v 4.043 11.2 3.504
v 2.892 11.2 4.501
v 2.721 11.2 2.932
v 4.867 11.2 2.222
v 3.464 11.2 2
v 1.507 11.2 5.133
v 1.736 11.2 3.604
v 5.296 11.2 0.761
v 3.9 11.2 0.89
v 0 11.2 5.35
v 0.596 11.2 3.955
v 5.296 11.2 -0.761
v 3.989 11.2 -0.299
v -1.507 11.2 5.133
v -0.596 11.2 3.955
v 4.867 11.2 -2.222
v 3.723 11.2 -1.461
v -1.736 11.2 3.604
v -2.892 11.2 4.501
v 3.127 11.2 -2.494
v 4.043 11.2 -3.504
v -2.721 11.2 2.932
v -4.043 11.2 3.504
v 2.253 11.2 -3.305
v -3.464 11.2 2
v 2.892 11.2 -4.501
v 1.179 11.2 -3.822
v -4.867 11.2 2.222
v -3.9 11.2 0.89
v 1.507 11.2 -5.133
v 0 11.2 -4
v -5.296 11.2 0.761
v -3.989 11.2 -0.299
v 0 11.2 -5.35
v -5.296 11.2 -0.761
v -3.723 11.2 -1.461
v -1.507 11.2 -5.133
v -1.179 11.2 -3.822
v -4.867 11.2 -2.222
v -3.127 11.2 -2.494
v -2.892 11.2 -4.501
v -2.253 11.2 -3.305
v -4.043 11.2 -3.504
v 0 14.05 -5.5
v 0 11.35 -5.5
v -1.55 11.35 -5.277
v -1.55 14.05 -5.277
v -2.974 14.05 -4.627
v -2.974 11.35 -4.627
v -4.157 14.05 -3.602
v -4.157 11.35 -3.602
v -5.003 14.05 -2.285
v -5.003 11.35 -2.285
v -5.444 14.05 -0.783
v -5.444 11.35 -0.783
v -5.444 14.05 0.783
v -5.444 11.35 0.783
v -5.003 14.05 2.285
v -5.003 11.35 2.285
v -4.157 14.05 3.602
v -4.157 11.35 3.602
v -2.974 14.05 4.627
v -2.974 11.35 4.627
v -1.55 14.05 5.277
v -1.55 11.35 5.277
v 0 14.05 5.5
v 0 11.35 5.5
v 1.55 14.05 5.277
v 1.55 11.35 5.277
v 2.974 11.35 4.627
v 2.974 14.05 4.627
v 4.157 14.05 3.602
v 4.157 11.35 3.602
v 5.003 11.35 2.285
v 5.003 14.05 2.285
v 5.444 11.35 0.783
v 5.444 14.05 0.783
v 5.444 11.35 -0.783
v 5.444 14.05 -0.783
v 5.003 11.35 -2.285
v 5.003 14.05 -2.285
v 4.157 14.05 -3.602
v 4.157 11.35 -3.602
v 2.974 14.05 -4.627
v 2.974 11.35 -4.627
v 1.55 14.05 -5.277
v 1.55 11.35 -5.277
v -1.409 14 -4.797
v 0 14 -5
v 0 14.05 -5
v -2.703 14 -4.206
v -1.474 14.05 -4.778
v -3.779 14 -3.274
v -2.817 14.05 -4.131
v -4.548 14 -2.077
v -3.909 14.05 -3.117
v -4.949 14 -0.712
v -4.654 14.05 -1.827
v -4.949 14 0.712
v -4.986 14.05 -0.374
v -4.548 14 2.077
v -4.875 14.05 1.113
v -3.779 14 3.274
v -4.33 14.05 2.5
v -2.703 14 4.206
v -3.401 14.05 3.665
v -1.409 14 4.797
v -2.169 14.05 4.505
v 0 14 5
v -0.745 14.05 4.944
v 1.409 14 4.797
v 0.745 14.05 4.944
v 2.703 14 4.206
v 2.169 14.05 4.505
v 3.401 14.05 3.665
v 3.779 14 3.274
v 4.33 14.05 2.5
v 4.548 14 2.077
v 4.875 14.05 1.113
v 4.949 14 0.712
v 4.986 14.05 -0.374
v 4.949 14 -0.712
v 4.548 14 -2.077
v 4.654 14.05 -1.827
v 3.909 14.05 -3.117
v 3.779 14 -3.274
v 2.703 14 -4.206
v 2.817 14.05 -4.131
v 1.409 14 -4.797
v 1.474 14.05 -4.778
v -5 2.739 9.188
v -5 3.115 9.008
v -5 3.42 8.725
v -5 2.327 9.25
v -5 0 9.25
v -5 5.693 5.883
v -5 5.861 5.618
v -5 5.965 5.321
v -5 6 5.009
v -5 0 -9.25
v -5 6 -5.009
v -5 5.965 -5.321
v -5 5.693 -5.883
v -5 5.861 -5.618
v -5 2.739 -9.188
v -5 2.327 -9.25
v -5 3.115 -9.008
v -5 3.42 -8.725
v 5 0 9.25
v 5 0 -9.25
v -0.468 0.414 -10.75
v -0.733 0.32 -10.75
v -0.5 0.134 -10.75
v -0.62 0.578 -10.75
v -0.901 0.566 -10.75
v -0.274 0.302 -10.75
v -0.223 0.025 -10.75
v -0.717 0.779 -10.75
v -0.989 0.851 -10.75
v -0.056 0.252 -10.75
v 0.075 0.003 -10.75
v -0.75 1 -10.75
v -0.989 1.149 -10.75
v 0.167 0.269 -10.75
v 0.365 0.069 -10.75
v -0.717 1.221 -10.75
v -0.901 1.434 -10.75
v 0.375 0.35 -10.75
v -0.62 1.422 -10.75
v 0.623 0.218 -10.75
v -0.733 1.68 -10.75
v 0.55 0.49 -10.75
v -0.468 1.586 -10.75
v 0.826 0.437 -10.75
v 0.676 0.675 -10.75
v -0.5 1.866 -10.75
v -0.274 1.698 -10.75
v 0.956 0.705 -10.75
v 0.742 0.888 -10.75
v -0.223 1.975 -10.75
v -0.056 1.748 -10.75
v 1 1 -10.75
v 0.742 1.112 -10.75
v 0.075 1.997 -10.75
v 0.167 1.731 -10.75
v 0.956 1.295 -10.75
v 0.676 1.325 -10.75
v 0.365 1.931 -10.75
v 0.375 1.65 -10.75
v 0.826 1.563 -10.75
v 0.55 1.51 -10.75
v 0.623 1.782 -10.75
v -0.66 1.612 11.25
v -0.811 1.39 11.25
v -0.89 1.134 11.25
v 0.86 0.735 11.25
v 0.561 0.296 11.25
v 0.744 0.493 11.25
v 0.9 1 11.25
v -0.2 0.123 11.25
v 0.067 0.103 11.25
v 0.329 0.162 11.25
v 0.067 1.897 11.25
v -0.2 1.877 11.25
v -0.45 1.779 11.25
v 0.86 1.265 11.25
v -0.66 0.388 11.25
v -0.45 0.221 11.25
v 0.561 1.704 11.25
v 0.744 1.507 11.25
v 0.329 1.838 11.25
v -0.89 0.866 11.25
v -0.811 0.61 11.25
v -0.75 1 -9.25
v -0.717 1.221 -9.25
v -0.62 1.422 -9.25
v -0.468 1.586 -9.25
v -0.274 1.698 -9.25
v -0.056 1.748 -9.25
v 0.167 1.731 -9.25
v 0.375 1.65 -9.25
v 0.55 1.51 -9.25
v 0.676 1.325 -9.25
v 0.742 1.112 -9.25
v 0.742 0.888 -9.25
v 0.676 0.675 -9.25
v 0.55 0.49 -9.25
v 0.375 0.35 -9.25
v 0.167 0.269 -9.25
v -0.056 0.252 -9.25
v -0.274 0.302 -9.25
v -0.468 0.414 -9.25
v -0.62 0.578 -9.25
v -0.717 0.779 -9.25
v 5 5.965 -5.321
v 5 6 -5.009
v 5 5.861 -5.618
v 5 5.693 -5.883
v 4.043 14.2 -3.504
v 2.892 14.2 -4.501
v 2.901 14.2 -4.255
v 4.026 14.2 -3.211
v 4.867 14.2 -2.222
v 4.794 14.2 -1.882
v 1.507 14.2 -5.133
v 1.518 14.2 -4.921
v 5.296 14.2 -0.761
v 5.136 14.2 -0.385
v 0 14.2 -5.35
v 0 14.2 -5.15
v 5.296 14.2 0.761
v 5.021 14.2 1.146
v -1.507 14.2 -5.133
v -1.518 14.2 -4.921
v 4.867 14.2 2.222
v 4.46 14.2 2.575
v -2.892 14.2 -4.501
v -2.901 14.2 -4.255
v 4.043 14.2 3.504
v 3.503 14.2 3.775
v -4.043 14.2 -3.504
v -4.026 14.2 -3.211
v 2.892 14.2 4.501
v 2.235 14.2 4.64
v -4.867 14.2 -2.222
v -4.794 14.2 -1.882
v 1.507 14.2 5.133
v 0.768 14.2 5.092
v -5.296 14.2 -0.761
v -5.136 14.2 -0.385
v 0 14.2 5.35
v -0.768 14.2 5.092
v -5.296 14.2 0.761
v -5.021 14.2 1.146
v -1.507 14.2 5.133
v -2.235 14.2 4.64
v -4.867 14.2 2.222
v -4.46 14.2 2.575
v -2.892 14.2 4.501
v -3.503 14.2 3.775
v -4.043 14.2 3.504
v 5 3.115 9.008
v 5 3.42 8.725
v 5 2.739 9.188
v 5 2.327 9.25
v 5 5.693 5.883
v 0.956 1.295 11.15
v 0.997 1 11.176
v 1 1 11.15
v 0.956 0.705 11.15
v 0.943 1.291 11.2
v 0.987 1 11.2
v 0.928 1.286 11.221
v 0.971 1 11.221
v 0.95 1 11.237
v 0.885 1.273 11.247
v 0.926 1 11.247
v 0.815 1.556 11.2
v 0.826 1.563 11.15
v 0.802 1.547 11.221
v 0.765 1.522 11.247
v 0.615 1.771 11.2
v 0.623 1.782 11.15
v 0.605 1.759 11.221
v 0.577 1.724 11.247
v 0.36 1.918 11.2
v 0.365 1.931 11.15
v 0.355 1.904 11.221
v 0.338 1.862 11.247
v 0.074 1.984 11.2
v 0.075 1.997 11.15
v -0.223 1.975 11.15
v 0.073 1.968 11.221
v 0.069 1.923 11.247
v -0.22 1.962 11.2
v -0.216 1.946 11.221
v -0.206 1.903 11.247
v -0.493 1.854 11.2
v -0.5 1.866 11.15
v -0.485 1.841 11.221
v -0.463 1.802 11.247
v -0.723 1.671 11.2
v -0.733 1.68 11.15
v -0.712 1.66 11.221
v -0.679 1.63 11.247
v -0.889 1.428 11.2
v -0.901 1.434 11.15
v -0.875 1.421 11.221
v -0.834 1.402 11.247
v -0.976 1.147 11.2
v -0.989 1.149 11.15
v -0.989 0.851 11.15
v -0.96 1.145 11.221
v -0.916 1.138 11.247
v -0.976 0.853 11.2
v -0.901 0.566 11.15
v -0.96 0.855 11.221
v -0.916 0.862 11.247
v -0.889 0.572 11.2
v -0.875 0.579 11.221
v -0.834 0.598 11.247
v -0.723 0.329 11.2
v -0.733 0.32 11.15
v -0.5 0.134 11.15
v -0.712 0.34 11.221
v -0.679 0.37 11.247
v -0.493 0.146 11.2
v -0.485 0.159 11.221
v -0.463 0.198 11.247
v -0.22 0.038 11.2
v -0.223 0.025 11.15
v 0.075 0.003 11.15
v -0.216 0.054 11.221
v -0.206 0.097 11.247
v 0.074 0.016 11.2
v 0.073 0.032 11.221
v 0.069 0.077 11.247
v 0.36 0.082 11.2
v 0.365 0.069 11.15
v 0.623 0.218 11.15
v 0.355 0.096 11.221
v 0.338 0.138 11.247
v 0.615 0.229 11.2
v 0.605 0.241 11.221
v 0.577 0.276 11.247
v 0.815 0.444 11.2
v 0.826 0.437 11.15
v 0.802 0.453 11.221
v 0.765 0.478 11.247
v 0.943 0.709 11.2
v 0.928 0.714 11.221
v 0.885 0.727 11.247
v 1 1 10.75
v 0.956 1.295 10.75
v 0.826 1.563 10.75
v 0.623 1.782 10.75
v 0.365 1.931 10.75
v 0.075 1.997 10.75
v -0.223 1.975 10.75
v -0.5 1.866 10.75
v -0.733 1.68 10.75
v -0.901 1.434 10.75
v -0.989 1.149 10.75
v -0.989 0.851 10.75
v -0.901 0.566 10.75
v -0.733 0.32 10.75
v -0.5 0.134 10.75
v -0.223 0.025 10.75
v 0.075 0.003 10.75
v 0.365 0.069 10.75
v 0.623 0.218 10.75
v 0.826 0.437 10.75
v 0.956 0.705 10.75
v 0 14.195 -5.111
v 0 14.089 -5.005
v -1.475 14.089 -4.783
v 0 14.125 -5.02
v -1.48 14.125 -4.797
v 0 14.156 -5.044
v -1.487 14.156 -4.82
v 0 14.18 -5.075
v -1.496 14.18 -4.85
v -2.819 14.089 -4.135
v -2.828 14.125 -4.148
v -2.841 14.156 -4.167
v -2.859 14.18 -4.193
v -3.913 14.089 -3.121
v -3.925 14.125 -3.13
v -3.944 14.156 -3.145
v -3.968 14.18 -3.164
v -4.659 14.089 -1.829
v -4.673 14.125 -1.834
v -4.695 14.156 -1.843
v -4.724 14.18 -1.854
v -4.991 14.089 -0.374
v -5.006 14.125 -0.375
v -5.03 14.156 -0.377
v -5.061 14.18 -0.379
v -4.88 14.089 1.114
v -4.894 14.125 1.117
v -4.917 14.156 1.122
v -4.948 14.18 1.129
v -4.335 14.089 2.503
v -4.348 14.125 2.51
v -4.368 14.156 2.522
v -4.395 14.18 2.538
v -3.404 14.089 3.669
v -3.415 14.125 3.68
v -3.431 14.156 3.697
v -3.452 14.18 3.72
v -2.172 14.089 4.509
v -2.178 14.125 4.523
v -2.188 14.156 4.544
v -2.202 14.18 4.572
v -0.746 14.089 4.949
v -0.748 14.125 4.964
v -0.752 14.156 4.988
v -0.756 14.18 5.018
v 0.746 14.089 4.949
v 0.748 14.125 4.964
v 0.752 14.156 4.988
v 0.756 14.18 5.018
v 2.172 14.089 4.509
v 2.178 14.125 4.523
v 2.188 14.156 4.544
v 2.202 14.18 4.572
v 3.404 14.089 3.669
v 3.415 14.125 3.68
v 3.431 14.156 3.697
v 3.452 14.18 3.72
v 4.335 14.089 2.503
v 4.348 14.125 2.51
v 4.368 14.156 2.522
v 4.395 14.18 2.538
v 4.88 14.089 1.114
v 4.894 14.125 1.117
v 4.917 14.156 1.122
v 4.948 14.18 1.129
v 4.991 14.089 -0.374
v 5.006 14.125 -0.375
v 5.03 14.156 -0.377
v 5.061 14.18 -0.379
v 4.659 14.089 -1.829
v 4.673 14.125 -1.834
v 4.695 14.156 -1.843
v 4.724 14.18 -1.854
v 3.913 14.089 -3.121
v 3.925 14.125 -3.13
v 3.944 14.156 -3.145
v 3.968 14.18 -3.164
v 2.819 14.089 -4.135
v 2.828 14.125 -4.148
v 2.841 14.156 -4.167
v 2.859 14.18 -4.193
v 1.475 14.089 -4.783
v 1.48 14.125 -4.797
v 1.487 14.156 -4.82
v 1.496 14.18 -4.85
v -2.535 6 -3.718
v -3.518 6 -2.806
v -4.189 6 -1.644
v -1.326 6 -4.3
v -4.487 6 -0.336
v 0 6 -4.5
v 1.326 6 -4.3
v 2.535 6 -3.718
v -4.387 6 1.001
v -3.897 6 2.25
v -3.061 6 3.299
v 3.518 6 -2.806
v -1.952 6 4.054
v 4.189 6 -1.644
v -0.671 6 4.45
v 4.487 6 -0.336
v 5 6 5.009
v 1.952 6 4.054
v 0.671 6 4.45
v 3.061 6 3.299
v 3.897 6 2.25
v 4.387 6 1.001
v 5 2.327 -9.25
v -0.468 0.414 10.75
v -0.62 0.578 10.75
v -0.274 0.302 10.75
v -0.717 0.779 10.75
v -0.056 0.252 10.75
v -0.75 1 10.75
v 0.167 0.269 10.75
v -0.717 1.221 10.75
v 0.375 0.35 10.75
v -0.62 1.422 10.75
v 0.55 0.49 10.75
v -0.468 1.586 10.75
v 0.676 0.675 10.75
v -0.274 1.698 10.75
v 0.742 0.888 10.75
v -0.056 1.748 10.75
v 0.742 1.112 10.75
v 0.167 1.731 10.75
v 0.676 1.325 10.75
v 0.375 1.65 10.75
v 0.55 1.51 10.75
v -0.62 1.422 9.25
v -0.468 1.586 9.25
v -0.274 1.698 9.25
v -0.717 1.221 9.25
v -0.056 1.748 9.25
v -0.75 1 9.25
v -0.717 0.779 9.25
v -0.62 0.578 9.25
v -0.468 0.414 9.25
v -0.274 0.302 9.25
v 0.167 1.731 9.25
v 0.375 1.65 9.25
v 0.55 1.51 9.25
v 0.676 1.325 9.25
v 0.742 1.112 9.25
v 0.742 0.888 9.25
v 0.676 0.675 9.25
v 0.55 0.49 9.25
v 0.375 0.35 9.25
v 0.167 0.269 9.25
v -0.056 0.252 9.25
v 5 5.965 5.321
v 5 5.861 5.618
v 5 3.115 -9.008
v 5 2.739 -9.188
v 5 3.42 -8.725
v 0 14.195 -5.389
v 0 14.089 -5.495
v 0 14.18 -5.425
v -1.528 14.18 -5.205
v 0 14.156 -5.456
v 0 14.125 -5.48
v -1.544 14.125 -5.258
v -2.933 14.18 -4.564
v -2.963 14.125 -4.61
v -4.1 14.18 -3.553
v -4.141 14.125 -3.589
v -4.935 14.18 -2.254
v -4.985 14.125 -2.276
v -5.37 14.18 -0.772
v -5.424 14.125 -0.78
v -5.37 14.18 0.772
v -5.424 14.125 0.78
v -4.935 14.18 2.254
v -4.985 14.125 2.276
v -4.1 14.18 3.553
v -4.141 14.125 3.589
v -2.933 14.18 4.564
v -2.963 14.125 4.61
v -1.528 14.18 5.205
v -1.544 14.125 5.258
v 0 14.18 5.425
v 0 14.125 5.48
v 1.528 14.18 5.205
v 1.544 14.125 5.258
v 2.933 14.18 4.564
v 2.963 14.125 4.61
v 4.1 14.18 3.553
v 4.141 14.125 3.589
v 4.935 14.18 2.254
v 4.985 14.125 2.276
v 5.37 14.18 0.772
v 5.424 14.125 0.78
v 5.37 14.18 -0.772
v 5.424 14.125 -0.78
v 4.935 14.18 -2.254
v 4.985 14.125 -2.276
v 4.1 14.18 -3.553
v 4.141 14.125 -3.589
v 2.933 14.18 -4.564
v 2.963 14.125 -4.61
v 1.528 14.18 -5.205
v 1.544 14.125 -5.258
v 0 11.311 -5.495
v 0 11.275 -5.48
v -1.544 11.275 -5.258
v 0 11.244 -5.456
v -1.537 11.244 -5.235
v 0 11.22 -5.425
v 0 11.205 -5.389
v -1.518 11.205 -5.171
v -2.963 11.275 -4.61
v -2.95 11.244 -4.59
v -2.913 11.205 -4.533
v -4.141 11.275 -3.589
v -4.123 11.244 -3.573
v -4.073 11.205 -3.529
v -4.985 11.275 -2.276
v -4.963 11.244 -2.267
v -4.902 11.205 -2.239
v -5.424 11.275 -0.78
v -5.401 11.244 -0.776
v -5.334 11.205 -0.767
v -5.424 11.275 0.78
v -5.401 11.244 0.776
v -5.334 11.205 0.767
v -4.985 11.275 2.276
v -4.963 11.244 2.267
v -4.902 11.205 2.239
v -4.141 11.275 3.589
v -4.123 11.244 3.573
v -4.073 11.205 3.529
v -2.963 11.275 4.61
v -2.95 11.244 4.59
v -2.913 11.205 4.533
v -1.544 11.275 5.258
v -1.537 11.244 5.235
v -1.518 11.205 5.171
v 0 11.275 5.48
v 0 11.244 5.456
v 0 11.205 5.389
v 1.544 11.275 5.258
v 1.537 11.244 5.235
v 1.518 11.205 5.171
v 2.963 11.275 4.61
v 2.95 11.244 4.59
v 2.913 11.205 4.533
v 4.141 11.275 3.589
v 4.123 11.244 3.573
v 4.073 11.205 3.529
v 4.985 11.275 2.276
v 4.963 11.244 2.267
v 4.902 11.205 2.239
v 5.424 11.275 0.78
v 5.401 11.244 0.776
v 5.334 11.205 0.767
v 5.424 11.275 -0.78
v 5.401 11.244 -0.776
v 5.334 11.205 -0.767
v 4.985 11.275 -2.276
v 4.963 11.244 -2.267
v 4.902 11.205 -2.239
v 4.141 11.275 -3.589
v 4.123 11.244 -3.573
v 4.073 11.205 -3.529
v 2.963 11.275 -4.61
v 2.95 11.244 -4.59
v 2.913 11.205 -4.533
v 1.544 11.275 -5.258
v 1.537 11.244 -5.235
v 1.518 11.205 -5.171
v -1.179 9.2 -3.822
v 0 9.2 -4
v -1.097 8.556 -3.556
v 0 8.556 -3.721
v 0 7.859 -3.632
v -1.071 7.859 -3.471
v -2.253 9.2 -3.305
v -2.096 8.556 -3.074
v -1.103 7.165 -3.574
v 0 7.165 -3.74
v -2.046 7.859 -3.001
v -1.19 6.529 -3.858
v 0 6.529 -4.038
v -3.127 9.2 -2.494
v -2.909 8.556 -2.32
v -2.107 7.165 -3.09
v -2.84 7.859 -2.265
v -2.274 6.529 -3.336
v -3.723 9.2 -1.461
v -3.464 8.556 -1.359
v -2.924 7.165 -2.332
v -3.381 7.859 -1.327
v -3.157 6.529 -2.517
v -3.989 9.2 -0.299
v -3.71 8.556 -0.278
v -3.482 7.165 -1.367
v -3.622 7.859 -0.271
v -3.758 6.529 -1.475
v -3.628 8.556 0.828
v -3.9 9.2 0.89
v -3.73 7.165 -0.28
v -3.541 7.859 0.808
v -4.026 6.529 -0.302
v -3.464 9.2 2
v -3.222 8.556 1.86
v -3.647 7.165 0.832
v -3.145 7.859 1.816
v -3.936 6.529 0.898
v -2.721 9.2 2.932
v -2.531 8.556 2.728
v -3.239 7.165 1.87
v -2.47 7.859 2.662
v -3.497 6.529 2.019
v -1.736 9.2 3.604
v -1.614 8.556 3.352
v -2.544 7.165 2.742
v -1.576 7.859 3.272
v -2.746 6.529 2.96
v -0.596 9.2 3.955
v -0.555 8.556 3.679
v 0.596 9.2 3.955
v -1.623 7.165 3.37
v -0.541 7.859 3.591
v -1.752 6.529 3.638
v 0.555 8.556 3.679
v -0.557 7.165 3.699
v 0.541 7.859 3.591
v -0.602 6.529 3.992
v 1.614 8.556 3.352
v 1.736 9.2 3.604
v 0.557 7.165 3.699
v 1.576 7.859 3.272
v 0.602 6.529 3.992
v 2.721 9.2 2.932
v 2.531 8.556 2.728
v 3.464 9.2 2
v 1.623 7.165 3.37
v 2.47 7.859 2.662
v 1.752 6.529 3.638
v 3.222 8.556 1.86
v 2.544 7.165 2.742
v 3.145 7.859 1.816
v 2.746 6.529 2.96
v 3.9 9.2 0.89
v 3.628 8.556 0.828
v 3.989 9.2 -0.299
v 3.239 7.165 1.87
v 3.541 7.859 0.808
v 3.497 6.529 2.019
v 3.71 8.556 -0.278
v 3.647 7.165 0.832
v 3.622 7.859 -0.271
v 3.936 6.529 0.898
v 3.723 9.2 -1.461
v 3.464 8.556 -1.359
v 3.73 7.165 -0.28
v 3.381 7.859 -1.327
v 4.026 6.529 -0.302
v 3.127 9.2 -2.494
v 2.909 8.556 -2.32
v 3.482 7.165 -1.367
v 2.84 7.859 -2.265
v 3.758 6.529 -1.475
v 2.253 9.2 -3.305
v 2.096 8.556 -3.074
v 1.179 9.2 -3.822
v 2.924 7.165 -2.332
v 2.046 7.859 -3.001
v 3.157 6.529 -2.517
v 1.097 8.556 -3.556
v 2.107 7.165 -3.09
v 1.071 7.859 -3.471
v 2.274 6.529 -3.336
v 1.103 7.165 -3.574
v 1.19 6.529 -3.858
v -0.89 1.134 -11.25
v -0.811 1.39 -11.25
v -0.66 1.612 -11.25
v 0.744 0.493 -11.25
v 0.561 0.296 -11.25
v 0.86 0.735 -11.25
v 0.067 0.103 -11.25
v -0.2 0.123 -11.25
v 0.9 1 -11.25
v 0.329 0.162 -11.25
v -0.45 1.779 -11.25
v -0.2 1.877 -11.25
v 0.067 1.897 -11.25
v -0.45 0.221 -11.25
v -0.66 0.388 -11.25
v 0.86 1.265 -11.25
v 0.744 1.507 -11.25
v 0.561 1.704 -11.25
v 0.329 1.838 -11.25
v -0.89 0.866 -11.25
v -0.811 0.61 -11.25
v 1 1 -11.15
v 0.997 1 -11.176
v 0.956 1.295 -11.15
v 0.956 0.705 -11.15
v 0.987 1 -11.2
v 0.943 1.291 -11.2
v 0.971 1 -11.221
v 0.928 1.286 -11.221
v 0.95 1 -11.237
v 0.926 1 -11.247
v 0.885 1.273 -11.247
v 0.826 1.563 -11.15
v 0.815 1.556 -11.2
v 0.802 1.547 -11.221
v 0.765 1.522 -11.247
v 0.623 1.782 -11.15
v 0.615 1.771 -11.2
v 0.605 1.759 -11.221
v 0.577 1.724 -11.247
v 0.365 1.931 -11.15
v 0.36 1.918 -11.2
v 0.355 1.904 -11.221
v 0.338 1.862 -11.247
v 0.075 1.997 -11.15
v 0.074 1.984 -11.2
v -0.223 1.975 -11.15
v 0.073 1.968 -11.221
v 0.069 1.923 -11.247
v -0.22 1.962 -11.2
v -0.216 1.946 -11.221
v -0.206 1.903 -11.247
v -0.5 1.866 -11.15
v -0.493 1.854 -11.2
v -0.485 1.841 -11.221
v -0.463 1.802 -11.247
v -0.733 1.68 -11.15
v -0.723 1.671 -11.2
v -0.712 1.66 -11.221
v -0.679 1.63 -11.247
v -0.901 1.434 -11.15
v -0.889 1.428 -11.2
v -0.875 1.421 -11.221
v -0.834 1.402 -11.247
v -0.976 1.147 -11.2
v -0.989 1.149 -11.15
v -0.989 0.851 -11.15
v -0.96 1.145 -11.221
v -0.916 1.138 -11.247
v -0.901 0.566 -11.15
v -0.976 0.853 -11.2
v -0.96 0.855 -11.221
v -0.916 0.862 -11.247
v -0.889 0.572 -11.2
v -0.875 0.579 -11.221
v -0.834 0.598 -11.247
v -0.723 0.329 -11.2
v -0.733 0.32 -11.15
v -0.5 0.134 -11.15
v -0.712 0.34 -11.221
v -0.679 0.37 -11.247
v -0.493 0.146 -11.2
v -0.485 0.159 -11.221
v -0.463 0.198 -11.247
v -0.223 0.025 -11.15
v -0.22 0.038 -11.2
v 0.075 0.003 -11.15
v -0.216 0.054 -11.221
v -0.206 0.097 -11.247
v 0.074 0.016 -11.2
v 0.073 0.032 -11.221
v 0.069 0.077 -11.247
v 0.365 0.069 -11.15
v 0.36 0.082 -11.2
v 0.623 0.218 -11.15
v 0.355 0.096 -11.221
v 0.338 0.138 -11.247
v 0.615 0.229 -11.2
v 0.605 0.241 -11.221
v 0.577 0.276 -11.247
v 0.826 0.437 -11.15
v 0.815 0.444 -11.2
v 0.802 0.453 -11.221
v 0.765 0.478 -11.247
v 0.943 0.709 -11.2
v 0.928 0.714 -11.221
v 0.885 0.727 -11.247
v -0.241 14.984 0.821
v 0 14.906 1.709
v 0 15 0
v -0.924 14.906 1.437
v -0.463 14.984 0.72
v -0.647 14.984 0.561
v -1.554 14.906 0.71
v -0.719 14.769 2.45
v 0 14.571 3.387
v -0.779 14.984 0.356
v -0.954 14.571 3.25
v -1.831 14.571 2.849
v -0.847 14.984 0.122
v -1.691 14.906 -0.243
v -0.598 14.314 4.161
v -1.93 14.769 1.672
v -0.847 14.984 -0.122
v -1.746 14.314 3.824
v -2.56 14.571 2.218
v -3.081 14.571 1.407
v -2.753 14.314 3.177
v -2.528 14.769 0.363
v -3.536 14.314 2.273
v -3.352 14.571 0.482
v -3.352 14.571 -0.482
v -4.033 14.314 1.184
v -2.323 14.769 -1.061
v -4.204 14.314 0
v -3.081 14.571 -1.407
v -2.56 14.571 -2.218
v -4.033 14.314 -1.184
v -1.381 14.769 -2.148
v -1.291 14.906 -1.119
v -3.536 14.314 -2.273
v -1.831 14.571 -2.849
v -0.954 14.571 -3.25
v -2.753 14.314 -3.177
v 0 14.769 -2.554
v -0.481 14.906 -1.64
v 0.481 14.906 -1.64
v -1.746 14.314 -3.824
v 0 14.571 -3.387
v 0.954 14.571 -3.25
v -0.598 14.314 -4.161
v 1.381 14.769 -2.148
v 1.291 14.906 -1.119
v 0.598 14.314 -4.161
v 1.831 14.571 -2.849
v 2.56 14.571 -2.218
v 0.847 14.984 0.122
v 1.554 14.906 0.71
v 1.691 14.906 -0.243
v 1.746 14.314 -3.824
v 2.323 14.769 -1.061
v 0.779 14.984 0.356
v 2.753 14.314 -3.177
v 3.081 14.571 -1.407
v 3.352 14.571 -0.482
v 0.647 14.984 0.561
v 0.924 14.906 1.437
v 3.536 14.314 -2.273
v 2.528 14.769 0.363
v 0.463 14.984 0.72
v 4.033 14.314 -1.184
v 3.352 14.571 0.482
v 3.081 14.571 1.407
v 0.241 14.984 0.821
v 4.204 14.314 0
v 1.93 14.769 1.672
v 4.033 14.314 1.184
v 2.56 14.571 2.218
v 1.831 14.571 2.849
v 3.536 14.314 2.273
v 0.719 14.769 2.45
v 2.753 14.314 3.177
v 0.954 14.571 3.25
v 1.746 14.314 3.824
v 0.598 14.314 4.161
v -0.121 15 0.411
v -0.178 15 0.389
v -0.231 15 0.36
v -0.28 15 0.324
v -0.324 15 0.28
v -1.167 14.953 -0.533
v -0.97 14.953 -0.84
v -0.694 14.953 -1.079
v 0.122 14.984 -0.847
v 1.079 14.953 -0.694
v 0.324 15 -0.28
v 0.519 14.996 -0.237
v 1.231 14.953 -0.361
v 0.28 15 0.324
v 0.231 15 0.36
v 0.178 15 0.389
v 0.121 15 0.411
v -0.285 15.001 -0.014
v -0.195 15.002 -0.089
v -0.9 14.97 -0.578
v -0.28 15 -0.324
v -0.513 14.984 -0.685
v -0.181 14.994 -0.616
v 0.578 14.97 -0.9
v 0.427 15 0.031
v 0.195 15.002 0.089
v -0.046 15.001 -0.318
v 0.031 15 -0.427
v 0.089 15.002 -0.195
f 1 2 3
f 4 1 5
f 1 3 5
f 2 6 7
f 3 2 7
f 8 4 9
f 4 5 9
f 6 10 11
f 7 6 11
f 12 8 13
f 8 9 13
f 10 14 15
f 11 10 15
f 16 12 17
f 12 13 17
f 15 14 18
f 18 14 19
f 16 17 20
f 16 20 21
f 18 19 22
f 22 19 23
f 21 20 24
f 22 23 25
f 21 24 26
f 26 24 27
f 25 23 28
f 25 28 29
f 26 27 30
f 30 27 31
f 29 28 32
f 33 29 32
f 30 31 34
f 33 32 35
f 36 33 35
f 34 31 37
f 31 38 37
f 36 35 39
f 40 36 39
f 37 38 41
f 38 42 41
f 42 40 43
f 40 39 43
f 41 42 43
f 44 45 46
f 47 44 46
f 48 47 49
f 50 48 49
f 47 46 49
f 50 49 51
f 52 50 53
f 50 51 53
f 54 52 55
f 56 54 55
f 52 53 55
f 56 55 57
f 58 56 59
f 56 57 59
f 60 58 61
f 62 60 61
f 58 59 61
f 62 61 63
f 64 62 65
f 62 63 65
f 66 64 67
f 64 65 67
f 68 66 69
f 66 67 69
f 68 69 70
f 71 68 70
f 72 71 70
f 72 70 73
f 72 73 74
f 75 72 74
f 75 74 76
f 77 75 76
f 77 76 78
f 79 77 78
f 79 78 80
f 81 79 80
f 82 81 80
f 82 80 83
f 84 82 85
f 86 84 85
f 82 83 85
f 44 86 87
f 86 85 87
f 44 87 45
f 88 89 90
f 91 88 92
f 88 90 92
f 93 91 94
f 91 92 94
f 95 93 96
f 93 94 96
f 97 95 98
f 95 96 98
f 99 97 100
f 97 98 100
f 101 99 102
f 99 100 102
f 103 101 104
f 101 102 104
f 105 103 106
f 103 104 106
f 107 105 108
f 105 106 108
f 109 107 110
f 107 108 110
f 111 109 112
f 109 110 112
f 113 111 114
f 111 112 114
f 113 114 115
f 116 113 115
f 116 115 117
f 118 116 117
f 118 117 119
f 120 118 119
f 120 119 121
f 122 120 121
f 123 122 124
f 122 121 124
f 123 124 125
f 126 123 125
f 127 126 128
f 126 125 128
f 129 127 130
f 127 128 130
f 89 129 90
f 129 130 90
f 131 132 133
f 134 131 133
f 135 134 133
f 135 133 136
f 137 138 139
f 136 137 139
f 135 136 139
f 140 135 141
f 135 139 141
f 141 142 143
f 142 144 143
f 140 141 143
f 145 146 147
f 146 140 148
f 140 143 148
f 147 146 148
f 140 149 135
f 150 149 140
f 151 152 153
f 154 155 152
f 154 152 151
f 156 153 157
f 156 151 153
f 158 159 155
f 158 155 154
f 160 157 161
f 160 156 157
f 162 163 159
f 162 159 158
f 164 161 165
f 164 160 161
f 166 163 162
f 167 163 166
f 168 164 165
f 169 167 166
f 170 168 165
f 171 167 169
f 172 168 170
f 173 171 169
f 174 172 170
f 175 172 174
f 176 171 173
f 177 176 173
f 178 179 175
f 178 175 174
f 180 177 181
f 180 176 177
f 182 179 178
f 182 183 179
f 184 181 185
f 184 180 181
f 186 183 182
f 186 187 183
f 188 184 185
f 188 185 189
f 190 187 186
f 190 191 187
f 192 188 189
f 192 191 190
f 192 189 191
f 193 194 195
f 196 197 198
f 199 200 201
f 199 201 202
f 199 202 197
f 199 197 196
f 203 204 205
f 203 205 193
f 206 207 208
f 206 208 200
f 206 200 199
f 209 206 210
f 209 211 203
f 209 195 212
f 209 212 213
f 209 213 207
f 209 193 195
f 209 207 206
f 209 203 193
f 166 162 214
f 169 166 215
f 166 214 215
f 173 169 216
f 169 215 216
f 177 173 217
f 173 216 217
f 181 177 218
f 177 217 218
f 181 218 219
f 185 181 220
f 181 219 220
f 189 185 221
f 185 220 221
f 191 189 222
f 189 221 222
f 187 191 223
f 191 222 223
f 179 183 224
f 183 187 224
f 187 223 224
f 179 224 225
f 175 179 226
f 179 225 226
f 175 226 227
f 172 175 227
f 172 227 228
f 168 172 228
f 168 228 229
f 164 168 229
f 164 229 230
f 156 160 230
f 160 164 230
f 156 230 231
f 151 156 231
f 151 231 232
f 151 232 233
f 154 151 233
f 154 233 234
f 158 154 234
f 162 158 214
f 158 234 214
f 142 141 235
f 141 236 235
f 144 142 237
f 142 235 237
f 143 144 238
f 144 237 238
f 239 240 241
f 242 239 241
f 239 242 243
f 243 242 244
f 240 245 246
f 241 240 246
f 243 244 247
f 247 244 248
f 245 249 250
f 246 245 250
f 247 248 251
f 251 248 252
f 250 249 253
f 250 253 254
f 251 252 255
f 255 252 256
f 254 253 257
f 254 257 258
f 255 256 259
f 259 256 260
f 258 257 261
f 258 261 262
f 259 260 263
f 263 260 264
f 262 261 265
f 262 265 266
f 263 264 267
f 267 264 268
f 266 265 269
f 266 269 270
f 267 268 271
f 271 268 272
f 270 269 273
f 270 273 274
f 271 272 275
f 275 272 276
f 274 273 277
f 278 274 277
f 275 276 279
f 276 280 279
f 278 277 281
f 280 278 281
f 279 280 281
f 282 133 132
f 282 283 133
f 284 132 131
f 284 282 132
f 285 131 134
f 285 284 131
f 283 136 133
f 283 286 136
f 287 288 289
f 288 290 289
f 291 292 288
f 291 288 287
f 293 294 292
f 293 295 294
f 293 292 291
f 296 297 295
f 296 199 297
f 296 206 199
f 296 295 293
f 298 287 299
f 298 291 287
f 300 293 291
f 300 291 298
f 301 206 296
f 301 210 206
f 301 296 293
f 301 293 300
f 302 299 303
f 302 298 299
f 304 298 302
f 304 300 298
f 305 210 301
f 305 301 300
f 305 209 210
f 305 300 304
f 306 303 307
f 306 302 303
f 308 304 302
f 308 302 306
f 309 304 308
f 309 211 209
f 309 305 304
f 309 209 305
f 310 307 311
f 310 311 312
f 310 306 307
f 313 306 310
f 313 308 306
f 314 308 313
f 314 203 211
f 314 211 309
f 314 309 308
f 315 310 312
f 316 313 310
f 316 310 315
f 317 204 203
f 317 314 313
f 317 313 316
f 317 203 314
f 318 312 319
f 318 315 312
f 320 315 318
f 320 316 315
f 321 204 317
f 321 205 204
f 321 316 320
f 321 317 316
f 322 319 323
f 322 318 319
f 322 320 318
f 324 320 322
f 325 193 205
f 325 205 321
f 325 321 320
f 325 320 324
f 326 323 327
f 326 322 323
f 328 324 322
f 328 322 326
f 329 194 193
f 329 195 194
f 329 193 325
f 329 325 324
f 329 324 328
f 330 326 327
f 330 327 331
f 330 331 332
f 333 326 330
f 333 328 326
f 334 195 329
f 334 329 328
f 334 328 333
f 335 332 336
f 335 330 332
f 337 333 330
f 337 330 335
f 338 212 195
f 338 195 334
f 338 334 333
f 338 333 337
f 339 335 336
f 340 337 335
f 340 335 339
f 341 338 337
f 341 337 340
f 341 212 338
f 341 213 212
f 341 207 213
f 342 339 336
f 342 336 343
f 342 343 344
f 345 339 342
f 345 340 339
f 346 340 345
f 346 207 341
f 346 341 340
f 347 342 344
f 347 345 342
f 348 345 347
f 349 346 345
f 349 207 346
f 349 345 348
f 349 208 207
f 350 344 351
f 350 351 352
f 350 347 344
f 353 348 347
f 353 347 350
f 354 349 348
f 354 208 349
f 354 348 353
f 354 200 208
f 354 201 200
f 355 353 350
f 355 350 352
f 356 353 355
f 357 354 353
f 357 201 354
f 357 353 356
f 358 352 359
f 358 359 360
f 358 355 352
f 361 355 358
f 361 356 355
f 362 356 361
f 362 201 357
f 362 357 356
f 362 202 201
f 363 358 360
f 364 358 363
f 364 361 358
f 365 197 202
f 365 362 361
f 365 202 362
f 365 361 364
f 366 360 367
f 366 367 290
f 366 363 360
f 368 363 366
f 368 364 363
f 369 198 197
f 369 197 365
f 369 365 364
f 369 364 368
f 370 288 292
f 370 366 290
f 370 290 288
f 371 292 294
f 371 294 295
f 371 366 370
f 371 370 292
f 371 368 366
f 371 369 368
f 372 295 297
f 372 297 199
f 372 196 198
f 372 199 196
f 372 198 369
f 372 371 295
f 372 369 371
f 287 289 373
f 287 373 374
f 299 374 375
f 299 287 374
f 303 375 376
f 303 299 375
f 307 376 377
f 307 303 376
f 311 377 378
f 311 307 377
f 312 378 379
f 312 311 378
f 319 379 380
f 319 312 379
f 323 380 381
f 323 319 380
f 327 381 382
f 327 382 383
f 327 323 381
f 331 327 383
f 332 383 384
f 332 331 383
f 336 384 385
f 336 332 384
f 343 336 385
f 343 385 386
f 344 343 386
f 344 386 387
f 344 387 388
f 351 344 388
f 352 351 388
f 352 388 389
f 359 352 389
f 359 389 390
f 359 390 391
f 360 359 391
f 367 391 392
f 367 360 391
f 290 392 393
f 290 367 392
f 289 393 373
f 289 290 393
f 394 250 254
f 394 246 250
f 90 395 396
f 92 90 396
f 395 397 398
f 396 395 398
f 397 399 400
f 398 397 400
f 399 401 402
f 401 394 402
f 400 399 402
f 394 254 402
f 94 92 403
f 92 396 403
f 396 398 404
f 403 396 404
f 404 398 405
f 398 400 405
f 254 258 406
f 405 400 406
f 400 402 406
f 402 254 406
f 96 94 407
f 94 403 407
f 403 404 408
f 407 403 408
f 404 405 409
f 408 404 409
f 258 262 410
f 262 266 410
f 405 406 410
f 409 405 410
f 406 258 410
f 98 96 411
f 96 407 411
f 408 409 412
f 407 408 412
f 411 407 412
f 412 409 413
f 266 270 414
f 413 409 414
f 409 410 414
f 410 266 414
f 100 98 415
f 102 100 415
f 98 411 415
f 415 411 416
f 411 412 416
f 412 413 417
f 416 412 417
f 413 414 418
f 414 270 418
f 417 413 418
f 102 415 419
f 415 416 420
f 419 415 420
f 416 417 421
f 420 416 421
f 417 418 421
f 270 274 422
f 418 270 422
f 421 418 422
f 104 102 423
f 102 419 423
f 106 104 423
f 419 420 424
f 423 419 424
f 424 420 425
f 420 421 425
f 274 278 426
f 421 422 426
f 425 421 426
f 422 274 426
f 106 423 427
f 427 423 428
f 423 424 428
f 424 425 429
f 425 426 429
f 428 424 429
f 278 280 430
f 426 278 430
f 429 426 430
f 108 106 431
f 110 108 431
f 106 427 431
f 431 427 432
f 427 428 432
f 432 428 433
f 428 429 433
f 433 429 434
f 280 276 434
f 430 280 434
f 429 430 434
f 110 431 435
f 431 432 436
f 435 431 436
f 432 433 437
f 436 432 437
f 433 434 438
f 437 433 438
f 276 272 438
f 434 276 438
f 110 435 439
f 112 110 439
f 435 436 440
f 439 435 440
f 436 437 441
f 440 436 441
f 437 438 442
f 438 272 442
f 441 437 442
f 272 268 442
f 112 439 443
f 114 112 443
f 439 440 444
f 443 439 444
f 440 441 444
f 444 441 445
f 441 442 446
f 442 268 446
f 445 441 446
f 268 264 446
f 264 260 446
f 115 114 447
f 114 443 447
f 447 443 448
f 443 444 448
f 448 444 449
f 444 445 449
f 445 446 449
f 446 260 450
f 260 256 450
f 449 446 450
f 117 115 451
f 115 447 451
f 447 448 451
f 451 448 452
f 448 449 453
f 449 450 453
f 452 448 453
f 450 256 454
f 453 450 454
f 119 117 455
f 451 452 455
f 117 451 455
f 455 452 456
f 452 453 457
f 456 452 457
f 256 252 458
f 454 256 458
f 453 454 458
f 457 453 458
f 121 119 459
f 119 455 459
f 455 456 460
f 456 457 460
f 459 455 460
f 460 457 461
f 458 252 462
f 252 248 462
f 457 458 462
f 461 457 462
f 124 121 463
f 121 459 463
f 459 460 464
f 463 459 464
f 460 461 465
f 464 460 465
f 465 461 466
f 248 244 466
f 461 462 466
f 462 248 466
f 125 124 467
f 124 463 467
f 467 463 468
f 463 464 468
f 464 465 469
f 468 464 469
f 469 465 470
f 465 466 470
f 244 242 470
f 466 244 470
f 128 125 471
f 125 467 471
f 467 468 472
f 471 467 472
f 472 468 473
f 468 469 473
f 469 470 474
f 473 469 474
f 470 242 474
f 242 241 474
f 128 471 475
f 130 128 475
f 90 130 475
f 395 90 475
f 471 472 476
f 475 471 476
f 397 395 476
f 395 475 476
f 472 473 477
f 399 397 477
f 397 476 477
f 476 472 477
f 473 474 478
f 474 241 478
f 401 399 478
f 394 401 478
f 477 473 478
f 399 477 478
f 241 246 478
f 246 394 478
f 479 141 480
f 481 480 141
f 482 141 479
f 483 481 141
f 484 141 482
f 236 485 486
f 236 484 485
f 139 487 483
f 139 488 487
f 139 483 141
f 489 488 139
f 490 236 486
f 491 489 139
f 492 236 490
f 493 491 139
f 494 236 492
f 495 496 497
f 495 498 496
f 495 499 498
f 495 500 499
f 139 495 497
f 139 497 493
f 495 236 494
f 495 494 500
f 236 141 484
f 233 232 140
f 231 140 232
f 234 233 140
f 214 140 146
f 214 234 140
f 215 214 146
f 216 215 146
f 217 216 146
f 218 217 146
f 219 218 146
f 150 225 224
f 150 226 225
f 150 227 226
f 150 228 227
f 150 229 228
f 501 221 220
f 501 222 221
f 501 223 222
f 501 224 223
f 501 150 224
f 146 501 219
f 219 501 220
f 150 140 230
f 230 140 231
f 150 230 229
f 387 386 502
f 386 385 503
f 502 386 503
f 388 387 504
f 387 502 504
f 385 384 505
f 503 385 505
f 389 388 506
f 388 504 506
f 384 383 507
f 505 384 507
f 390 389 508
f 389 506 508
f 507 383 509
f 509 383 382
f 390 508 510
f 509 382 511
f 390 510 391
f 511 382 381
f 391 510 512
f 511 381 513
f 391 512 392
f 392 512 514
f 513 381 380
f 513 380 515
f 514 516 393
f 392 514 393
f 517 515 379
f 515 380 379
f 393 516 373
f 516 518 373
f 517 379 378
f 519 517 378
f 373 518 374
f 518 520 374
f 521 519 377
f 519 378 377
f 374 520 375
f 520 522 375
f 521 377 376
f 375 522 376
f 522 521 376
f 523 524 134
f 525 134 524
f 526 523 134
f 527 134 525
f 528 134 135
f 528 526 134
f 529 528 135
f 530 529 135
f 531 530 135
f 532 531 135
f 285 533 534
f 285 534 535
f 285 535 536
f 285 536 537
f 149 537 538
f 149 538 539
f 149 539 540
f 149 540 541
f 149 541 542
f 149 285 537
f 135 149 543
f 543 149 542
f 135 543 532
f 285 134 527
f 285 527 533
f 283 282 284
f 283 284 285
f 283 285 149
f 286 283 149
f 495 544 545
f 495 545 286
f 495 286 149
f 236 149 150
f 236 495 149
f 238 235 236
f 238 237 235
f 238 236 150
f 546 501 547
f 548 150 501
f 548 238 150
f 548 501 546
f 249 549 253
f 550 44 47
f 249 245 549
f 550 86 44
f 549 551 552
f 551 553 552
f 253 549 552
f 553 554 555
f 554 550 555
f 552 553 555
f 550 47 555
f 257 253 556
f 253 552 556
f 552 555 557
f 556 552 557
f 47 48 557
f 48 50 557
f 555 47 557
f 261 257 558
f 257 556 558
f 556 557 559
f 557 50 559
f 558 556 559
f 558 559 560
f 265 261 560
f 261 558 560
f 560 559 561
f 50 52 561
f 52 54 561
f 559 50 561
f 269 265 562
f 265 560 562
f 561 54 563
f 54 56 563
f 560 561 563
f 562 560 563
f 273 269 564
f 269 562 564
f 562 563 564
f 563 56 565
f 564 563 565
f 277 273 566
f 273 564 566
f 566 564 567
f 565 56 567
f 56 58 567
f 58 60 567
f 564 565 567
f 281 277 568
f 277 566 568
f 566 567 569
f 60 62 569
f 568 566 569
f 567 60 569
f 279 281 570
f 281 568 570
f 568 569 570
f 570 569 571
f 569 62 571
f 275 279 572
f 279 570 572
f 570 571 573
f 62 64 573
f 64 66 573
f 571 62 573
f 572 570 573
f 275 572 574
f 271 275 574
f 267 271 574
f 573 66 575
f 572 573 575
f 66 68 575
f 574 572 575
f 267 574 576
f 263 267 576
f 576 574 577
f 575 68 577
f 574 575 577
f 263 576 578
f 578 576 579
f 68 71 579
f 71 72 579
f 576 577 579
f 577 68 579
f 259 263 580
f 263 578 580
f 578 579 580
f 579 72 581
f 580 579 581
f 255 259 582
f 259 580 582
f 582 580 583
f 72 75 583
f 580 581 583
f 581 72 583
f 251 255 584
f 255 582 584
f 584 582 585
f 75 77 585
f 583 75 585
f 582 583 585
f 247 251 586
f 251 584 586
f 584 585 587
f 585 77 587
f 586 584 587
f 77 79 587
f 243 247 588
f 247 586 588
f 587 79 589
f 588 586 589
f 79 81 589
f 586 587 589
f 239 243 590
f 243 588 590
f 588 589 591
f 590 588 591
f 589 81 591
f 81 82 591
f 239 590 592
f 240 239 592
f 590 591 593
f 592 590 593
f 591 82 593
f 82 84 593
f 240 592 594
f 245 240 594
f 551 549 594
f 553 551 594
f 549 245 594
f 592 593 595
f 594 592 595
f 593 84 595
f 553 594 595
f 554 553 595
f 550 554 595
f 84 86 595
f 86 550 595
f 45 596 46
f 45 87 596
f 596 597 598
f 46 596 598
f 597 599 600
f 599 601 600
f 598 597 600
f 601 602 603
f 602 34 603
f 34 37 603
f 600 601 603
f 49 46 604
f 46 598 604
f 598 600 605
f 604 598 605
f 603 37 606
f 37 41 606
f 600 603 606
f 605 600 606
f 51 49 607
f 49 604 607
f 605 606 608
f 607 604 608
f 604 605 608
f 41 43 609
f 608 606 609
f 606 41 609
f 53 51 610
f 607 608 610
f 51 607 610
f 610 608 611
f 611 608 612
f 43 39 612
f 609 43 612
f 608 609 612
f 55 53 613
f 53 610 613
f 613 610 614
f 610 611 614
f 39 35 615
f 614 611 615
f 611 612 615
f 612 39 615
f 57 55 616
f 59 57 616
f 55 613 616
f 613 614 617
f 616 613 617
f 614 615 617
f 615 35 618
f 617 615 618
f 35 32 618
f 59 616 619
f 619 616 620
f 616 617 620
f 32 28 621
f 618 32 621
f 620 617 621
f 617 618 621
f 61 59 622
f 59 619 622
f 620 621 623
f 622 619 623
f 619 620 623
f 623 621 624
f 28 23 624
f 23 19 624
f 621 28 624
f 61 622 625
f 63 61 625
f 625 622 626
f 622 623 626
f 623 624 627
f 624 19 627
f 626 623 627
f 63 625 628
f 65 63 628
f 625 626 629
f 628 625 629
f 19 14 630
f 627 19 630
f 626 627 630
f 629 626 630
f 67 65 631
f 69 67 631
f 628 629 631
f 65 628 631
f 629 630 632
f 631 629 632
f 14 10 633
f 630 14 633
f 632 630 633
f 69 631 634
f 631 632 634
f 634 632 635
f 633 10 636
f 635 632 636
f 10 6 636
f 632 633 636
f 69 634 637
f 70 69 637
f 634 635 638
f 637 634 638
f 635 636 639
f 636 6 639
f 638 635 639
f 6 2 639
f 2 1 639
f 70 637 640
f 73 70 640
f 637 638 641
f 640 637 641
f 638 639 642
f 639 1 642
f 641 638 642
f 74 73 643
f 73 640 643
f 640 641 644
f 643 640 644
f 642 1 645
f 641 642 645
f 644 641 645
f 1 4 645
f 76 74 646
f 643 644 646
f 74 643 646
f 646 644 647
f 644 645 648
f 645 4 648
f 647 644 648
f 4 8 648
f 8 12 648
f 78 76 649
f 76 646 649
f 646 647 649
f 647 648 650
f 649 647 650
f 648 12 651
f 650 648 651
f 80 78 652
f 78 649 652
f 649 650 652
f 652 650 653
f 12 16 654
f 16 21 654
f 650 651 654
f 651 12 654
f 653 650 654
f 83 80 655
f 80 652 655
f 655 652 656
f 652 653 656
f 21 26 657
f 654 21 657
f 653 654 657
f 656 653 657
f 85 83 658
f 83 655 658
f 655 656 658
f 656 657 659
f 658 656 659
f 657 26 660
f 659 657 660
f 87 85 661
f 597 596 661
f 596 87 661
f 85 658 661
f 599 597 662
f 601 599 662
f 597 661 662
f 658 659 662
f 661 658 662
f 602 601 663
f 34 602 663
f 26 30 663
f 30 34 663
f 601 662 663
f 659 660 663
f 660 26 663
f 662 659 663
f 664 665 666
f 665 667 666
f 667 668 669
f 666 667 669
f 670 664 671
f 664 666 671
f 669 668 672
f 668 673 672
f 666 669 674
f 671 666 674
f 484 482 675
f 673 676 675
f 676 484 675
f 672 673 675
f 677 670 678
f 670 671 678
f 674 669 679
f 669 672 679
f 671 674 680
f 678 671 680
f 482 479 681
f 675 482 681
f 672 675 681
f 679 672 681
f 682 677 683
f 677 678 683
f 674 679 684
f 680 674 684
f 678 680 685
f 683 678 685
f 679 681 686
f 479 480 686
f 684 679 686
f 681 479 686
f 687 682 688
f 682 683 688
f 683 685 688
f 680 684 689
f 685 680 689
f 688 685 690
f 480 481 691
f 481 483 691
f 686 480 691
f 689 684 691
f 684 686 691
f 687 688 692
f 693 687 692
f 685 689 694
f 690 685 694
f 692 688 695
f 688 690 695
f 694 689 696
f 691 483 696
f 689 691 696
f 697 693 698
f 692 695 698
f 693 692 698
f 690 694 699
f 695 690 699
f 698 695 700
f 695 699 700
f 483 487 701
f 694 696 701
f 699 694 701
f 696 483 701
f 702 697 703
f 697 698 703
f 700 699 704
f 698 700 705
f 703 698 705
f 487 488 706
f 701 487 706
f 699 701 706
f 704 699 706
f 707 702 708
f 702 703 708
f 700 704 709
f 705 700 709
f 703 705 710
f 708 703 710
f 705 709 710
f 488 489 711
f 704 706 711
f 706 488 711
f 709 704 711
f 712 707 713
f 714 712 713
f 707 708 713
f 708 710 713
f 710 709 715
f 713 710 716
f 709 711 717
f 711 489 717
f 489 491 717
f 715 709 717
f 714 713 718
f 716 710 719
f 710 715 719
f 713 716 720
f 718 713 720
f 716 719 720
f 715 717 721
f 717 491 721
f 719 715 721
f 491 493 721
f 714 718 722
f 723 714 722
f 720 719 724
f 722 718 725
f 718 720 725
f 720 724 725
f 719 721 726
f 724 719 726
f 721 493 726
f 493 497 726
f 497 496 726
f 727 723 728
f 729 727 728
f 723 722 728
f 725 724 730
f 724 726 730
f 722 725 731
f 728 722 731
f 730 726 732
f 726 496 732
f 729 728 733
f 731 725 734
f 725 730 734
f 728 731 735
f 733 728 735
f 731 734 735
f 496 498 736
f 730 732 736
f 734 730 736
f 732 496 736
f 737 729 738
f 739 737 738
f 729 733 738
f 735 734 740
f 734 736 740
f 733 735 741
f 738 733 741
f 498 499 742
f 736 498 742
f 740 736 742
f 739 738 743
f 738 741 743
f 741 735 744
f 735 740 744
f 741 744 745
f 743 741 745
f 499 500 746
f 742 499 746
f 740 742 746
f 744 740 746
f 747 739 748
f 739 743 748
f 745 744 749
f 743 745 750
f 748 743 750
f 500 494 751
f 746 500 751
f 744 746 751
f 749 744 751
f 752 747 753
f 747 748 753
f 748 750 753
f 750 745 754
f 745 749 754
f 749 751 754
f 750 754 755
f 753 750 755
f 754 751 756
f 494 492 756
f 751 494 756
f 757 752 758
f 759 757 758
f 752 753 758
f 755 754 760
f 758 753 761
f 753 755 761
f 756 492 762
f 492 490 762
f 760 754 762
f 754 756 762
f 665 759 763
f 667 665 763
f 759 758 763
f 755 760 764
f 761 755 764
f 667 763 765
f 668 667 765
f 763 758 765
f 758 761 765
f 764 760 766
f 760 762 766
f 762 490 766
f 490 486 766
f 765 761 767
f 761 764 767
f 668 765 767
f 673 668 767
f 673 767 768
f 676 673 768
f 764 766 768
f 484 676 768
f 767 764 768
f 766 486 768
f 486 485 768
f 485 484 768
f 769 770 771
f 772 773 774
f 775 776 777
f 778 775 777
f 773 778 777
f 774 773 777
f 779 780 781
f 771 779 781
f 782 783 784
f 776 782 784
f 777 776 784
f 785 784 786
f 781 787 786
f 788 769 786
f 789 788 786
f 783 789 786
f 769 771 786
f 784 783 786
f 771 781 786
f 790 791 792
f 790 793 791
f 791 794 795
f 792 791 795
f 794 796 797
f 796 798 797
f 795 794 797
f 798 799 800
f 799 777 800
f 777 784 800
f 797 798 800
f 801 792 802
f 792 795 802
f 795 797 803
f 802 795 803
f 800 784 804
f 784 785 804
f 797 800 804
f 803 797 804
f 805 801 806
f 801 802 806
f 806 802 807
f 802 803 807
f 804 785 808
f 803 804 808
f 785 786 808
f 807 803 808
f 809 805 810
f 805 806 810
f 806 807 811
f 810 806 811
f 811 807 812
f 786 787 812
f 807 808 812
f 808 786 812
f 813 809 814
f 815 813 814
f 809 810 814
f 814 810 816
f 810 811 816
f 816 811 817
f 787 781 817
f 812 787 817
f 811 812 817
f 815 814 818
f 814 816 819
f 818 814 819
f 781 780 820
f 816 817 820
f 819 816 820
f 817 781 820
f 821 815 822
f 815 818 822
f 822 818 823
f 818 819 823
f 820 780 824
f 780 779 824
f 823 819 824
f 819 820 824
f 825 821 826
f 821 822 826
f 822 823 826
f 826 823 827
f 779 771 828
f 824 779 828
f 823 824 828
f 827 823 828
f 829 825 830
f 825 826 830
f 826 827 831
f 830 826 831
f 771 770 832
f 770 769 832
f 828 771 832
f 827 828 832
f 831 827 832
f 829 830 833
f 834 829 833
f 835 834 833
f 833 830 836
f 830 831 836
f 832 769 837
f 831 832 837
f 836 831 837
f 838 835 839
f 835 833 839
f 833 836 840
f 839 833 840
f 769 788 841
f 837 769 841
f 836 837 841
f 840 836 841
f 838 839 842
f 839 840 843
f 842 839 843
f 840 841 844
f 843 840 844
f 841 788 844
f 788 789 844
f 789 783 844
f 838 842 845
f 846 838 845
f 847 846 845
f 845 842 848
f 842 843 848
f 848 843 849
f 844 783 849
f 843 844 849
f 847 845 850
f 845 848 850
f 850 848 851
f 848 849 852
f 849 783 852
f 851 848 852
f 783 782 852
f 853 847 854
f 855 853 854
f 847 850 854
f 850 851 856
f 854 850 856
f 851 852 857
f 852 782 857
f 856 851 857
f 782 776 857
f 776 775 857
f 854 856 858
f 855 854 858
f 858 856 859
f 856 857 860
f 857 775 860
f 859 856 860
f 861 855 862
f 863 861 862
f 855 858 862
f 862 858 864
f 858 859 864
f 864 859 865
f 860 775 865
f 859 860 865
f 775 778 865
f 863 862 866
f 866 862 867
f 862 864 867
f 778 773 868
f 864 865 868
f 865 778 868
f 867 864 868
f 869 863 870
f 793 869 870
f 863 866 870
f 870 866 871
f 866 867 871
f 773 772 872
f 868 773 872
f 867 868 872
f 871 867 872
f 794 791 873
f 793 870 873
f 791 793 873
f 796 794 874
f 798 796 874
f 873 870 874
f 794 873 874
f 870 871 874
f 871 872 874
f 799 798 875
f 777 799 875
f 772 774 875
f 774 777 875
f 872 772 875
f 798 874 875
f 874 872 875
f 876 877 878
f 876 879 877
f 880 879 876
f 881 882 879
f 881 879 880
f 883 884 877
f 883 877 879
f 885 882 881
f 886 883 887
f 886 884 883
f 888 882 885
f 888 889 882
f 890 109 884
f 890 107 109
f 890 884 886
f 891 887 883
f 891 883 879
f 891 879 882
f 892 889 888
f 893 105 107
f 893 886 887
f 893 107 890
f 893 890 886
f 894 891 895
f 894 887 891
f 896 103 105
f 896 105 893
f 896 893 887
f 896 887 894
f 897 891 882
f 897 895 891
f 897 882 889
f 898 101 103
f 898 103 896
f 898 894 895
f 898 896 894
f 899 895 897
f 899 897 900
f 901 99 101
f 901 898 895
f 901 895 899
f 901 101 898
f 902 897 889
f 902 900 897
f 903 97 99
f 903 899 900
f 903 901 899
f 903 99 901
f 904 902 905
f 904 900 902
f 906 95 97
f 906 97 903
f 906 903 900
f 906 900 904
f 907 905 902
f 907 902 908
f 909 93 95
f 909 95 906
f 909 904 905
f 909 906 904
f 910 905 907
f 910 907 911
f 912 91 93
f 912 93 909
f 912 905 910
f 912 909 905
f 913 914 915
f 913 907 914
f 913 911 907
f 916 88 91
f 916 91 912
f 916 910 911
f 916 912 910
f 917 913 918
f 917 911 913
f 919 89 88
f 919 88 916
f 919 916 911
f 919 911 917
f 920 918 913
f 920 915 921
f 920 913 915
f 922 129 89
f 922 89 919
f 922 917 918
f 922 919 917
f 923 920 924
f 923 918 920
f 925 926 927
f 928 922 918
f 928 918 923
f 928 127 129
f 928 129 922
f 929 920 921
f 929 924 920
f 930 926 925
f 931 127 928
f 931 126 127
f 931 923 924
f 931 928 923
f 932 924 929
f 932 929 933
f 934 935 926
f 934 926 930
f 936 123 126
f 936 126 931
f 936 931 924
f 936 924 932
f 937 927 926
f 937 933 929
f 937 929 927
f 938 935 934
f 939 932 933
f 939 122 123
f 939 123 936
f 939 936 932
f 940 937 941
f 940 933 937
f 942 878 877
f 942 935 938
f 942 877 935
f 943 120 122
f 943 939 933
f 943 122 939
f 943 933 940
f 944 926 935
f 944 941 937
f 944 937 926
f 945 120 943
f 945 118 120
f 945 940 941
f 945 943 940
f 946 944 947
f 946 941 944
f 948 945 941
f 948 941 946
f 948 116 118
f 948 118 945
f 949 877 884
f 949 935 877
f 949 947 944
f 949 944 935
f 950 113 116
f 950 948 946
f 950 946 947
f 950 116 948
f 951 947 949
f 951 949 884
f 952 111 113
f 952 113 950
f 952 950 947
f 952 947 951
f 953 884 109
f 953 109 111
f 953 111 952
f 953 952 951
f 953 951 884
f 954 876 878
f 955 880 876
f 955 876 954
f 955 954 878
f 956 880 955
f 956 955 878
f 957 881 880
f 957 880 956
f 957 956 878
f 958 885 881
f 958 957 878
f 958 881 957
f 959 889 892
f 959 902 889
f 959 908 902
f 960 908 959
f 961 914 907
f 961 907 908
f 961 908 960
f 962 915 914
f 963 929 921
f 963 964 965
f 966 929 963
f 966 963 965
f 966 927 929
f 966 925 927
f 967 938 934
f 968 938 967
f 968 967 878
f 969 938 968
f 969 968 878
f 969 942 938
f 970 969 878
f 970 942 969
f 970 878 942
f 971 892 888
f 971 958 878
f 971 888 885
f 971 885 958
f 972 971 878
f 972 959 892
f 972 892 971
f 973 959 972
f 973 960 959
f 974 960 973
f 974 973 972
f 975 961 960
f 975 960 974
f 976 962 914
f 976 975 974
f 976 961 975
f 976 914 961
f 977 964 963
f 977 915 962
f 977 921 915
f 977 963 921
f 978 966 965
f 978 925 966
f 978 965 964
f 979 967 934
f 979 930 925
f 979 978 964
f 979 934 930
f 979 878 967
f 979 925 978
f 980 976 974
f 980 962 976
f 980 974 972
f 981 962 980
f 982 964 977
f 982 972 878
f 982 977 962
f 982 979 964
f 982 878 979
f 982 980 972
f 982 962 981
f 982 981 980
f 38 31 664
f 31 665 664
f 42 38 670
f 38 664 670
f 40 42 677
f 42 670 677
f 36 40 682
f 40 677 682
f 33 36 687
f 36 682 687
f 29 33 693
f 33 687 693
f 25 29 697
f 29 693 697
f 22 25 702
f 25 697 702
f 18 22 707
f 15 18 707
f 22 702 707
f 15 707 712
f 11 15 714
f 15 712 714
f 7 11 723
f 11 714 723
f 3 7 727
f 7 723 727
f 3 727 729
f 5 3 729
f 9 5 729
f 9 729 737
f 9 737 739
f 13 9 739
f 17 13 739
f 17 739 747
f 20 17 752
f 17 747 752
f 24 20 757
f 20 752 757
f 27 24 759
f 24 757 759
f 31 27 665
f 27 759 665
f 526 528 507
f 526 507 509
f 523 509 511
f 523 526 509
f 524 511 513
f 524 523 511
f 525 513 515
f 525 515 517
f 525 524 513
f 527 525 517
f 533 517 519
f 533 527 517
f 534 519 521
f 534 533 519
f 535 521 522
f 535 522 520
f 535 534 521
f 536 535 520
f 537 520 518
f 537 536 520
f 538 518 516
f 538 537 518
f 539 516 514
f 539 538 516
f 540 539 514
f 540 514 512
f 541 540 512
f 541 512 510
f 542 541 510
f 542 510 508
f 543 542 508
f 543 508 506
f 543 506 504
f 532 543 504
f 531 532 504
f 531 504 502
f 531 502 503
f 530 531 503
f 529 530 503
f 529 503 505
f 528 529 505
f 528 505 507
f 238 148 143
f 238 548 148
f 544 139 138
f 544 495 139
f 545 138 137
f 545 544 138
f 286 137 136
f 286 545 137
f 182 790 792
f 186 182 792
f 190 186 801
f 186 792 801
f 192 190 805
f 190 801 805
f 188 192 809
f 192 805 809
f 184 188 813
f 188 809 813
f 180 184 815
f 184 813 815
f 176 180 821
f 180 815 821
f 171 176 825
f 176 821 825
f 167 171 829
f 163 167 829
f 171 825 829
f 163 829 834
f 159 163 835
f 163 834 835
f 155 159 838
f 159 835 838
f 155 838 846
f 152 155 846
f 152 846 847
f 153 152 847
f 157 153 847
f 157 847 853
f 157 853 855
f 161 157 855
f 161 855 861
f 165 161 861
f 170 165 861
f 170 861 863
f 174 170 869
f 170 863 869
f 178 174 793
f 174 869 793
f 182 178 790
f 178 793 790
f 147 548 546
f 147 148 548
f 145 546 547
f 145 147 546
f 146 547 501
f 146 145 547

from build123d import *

# Parameters (mm, degrees)
BOSS_EXTRUDE1_DEPTH  = 5
FILLET1_R            = 0.15
FILLET2_R            = 1.4
SKETCH4_R            = 0.75
BOSS_EXTRUDE2_DEPTH  = 2
SKETCH5_R            = 1
BOSS_EXTRUDE3_DEPTH  = 0.5
FILLET3_R            = 0.1
FILLET3_OF_MIRROR2_R = 0.1


with BuildPart() as part:
    # Sketch1 → Boss-Extrude1 (new body, symmetric)
    with BuildSketch(Plane(origin=(0, 0, 0), x_dir=(0, 0, -1), z_dir=(1, 0, 0))):
        Polygon((9.25, 3), (5.5, 6), (-5.5, 6), (-9.25, 3), (-9.25, 0), (9.25, 0), align=None)
    extrude(amount=BOSS_EXTRUDE1_DEPTH, both=True)

    # Sketch2 → Revolve1 (revolve)
    with BuildSketch(Plane(origin=(0, 0, 0), x_dir=(0, 0, -1), z_dir=(1, 0, 0))):
        with BuildLine():
            Line((0, 6), (0, 14))
            Line((0, 14), (5, 14))
            Line((5, 14), (5, 14.2))
            Line((5, 14.2), (5.5, 14.2))
            Line((5.5, 14.2), (5.5, 11.2))
            Line((5.5, 11.2), (4, 11.2))
            Line((4, 11.2), (4, 9.2))
            ThreePointArc((4, 9.2), (3.661737334, 7.508083958), (4.5, 6))
            Line((4.5, 6), (0, 6))
        make_face()
    revolve(axis=Axis((0, 0, 0), (0, 1, 0)))

    # Sketch3 → Revolve2 (revolve)
    with BuildSketch(Plane(origin=(0, 0, 0), x_dir=(0, 0, -1), z_dir=(1, 0, 0))):
        with BuildLine():
            Line((0, 14.2), (0, 15))
            ThreePointArc((0, 15), (-2.553728094, 14.768640471), (-5, 14))
            Line((-5, 14), (0, 14))
            Line((0, 14), (0, 14.2))
        make_face()
    revolve(axis=Axis((0, 14.2, 0), (0, -1, 0)))

    # Fillet1
    fillet1_edges = [part.edges().sort_by_distance(p)[0] for p in [
        (0, 11.2, 5.5),
        (0, 14.2, 5.5),
        (0, 14.2, 5),
    ]]
    fillet(fillet1_edges, radius=FILLET1_R)

    # Fillet2
    fillet2_edges = [part.edges().sort_by_distance(p)[0] for p in [
        (0, 3, 9.25),
        (0, 6, 5.5),
        (0, 6, -5.5),
        (0, 3, -9.25),
    ]]
    fillet(fillet2_edges, radius=FILLET2_R)

    # Sketch4 → Boss-Extrude2 (add)
    with BuildSketch(Plane(origin=(0, 0, -9.25), x_dir=(-1, 0, 0), z_dir=(0, 0, -1))):
        with Locations((0, 1)):
            Circle(SKETCH4_R)
    boss_extrude2 = extrude(amount=BOSS_EXTRUDE2_DEPTH)

    # Mirror1: Boss-Extrude2 across plane
    add(boss_extrude2.mirror(Plane.XY))

    # Sketch5 → Boss-Extrude3 (add)
    with BuildSketch(Plane.XY.offset(11.25)):
        with Locations((0, 1)):
            Circle(SKETCH5_R)
    boss_extrude3 = extrude(amount=-BOSS_EXTRUDE3_DEPTH)

    # Fillet3
    fillet3_edges = [part.edges().sort_by_distance(p)[0] for p in [
        (-1, 1, 11.25),
    ]]
    fillet(fillet3_edges, radius=FILLET3_R)

    # Mirror2: Boss-Extrude3 across plane
    add(boss_extrude3.mirror(Plane.XY))

    # Fillet3 of Mirror2
    fillet3_of_mirror2_edges = [part.edges().sort_by_distance(p)[0] for p in [
        (-1, 1, -11.25),
    ]]
    fillet(fillet3_of_mirror2_edges, radius=FILLET3_OF_MIRROR2_R)


solid = part.part
